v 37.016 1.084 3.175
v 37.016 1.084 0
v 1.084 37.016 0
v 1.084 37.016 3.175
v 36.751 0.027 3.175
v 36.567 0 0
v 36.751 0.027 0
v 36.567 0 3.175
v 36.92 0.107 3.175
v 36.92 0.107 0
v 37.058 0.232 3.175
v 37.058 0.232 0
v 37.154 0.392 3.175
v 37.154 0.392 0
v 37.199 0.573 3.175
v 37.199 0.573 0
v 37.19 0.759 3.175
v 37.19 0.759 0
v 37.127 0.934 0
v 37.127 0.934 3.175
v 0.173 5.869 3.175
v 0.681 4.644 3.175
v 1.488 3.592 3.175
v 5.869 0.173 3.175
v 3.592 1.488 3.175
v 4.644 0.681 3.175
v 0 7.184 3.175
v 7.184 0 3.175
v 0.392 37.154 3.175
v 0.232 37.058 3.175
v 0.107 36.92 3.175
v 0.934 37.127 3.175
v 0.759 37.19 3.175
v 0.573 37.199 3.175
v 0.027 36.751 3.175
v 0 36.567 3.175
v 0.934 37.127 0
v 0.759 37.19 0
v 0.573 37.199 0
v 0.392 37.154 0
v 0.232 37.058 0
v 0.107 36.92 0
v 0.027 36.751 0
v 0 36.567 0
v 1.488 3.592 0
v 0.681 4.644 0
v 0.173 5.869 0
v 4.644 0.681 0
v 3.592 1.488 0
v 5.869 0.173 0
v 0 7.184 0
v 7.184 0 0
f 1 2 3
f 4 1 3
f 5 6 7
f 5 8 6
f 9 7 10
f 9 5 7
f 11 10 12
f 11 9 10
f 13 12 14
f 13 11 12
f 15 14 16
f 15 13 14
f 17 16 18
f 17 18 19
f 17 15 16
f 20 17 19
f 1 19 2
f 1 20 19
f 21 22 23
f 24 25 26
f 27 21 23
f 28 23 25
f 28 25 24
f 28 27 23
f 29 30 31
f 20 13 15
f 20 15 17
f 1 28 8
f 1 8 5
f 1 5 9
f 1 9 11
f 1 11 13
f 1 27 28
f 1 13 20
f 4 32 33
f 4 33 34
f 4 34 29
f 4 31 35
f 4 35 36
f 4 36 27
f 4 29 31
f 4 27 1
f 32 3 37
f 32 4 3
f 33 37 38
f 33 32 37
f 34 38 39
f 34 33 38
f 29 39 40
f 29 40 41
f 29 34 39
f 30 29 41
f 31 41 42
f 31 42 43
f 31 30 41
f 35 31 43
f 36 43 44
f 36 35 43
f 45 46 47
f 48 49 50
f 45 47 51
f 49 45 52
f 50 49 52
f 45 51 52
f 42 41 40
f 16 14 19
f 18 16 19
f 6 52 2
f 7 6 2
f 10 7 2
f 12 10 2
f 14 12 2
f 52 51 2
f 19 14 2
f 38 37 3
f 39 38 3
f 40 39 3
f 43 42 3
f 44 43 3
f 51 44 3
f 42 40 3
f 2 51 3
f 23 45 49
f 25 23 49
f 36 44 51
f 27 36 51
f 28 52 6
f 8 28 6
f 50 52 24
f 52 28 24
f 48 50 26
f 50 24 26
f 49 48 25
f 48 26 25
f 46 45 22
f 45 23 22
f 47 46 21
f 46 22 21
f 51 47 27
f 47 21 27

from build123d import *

# Parameters (mm, degrees)
F1_DEPTH = 3.175
F2_R     = 0.635
F3_R     = 5.08


with BuildPart() as f1:
    # F0 (on Top) → F1 (new body)
    with BuildSketch(Plane.XY):
        Polygon((0, 5.08), (5.08, 0), (38.1, 0), (0, 38.1), align=None)
    extrude(amount=F1_DEPTH)

    # F2
    f2_edges = [f1.edges().sort_by_distance(p)[0] for p in [
        (0, 38.1, 1.5875),
        (38.1, 0, 1.5875),
    ]]
    fillet(f2_edges, radius=F2_R)

    # F3
    f3_edges = [f1.edges().sort_by_distance(p)[0] for p in [
        (5.08, 0, 1.5875),
        (0, 5.08, 1.5875),
    ]]
    fillet(f3_edges, radius=F3_R)


solid = f1.part
